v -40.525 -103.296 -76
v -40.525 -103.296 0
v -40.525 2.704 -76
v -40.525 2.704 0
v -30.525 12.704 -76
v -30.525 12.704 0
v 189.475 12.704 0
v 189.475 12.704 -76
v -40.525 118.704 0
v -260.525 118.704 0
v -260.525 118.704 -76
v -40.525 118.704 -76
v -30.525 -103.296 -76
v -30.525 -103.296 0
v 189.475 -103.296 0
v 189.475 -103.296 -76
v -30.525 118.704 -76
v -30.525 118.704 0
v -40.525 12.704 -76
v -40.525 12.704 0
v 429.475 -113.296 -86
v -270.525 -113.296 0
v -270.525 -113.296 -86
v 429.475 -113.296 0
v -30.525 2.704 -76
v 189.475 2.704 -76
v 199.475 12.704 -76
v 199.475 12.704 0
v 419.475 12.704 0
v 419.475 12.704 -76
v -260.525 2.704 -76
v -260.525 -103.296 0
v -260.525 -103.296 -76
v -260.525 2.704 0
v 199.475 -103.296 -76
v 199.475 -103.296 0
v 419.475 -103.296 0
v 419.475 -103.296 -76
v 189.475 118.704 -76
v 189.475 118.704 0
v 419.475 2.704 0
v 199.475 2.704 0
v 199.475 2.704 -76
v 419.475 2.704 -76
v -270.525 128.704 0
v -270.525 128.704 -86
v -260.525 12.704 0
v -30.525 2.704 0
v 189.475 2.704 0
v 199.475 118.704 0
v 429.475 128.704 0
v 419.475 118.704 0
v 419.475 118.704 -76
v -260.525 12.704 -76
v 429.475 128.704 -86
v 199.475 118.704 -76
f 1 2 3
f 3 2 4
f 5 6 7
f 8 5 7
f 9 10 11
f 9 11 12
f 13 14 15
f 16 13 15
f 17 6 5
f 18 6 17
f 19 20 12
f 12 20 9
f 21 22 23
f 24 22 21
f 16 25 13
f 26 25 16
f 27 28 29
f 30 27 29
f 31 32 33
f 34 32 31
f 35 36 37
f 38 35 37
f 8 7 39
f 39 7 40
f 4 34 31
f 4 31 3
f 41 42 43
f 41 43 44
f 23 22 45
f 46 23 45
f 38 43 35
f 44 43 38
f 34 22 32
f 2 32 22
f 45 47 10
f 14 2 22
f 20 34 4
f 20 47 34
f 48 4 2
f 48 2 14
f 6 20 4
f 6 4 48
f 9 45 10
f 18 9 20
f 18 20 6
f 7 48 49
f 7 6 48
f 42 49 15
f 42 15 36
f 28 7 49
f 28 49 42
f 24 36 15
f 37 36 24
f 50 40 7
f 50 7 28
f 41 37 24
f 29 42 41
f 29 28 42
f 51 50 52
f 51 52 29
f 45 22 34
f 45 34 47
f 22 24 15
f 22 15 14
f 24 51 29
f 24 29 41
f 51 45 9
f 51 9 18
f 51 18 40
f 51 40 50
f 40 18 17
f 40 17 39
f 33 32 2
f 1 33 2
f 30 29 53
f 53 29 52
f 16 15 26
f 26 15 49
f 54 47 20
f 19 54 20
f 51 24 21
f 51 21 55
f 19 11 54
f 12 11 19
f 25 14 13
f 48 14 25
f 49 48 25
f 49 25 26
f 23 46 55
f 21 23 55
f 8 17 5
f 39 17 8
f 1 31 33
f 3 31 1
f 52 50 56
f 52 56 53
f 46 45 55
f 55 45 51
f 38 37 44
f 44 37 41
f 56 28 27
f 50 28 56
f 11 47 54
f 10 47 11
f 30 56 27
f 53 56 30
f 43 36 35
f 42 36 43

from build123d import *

# Parameters (mm, degrees)
F2_W     = 700
F2_H     = 242
F2_W_2   = 220
F2_H_2   = 106
F3_DEPTH = 86
F4_DEPTH = 76


with BuildPart() as f3:
    # F2 (on Top) → F3 (new body)
    with BuildSketch(Plane.XY):
        with Locations((79.4747328101, 7.7042136107)):
            Rectangle(F2_W, F2_H)
        with Locations((-150.5252671899, -50.2957863893)):
            Rectangle(F2_W_2, F2_H_2, mode=Mode.SUBTRACT)
        with Locations((79.4747328101, -50.2957863893)):
            Rectangle(F2_W_2, F2_H_2, mode=Mode.SUBTRACT)
        with Locations((309.4747328101, -50.2957863893)):
            Rectangle(F2_W_2, F2_H_2, mode=Mode.SUBTRACT)
        with Locations((-150.5252671899, 65.7042136107)):
            Rectangle(F2_W_2, F2_H_2, mode=Mode.SUBTRACT)
        with Locations((79.4747328101, 65.7042136107)):
            Rectangle(F2_W_2, F2_H_2, mode=Mode.SUBTRACT)
        with Locations((309.4747328101, 65.7042136107)):
            Rectangle(F2_W_2, F2_H_2, mode=Mode.SUBTRACT)
        with Locations((-150.5252671899, 65.7042136107)):
            Rectangle(F2_W_2, F2_H_2)
        with Locations((-150.5252671899, -50.2957863893)):
            Rectangle(F2_W_2, F2_H_2)
        with Locations((79.4747328101, -50.2957863893)):
            Rectangle(F2_W_2, F2_H_2)
        with Locations((79.4747328101, 65.7042136107)):
            Rectangle(F2_W_2, F2_H_2)
        with Locations((309.4747328101, 65.7042136107)):
            Rectangle(F2_W_2, F2_H_2)
        with Locations((309.4747328101, -50.2957863893)):
            Rectangle(F2_W_2, F2_H_2)
    extrude(amount=-F3_DEPTH)

    # F2 (on Top) → F4 (cut)
    with BuildSketch(Plane.XY):
        with Locations((-150.5252671899, 65.7042136107)):
            Rectangle(F2_W_2, F2_H_2)
        with Locations((-150.5252671899, -50.2957863893)):
            Rectangle(F2_W_2, F2_H_2)
        with Locations((79.4747328101, 65.7042136107)):
            Rectangle(F2_W_2, F2_H_2)
        with Locations((79.4747328101, -50.2957863893)):
            Rectangle(F2_W_2, F2_H_2)
        with Locations((309.4747328101, 65.7042136107)):
            Rectangle(F2_W_2, F2_H_2)
        with Locations((309.4747328101, -50.2957863893)):
            Rectangle(F2_W_2, F2_H_2)
    extrude(amount=-F4_DEPTH, mode=Mode.SUBTRACT)


solid = f3.part
